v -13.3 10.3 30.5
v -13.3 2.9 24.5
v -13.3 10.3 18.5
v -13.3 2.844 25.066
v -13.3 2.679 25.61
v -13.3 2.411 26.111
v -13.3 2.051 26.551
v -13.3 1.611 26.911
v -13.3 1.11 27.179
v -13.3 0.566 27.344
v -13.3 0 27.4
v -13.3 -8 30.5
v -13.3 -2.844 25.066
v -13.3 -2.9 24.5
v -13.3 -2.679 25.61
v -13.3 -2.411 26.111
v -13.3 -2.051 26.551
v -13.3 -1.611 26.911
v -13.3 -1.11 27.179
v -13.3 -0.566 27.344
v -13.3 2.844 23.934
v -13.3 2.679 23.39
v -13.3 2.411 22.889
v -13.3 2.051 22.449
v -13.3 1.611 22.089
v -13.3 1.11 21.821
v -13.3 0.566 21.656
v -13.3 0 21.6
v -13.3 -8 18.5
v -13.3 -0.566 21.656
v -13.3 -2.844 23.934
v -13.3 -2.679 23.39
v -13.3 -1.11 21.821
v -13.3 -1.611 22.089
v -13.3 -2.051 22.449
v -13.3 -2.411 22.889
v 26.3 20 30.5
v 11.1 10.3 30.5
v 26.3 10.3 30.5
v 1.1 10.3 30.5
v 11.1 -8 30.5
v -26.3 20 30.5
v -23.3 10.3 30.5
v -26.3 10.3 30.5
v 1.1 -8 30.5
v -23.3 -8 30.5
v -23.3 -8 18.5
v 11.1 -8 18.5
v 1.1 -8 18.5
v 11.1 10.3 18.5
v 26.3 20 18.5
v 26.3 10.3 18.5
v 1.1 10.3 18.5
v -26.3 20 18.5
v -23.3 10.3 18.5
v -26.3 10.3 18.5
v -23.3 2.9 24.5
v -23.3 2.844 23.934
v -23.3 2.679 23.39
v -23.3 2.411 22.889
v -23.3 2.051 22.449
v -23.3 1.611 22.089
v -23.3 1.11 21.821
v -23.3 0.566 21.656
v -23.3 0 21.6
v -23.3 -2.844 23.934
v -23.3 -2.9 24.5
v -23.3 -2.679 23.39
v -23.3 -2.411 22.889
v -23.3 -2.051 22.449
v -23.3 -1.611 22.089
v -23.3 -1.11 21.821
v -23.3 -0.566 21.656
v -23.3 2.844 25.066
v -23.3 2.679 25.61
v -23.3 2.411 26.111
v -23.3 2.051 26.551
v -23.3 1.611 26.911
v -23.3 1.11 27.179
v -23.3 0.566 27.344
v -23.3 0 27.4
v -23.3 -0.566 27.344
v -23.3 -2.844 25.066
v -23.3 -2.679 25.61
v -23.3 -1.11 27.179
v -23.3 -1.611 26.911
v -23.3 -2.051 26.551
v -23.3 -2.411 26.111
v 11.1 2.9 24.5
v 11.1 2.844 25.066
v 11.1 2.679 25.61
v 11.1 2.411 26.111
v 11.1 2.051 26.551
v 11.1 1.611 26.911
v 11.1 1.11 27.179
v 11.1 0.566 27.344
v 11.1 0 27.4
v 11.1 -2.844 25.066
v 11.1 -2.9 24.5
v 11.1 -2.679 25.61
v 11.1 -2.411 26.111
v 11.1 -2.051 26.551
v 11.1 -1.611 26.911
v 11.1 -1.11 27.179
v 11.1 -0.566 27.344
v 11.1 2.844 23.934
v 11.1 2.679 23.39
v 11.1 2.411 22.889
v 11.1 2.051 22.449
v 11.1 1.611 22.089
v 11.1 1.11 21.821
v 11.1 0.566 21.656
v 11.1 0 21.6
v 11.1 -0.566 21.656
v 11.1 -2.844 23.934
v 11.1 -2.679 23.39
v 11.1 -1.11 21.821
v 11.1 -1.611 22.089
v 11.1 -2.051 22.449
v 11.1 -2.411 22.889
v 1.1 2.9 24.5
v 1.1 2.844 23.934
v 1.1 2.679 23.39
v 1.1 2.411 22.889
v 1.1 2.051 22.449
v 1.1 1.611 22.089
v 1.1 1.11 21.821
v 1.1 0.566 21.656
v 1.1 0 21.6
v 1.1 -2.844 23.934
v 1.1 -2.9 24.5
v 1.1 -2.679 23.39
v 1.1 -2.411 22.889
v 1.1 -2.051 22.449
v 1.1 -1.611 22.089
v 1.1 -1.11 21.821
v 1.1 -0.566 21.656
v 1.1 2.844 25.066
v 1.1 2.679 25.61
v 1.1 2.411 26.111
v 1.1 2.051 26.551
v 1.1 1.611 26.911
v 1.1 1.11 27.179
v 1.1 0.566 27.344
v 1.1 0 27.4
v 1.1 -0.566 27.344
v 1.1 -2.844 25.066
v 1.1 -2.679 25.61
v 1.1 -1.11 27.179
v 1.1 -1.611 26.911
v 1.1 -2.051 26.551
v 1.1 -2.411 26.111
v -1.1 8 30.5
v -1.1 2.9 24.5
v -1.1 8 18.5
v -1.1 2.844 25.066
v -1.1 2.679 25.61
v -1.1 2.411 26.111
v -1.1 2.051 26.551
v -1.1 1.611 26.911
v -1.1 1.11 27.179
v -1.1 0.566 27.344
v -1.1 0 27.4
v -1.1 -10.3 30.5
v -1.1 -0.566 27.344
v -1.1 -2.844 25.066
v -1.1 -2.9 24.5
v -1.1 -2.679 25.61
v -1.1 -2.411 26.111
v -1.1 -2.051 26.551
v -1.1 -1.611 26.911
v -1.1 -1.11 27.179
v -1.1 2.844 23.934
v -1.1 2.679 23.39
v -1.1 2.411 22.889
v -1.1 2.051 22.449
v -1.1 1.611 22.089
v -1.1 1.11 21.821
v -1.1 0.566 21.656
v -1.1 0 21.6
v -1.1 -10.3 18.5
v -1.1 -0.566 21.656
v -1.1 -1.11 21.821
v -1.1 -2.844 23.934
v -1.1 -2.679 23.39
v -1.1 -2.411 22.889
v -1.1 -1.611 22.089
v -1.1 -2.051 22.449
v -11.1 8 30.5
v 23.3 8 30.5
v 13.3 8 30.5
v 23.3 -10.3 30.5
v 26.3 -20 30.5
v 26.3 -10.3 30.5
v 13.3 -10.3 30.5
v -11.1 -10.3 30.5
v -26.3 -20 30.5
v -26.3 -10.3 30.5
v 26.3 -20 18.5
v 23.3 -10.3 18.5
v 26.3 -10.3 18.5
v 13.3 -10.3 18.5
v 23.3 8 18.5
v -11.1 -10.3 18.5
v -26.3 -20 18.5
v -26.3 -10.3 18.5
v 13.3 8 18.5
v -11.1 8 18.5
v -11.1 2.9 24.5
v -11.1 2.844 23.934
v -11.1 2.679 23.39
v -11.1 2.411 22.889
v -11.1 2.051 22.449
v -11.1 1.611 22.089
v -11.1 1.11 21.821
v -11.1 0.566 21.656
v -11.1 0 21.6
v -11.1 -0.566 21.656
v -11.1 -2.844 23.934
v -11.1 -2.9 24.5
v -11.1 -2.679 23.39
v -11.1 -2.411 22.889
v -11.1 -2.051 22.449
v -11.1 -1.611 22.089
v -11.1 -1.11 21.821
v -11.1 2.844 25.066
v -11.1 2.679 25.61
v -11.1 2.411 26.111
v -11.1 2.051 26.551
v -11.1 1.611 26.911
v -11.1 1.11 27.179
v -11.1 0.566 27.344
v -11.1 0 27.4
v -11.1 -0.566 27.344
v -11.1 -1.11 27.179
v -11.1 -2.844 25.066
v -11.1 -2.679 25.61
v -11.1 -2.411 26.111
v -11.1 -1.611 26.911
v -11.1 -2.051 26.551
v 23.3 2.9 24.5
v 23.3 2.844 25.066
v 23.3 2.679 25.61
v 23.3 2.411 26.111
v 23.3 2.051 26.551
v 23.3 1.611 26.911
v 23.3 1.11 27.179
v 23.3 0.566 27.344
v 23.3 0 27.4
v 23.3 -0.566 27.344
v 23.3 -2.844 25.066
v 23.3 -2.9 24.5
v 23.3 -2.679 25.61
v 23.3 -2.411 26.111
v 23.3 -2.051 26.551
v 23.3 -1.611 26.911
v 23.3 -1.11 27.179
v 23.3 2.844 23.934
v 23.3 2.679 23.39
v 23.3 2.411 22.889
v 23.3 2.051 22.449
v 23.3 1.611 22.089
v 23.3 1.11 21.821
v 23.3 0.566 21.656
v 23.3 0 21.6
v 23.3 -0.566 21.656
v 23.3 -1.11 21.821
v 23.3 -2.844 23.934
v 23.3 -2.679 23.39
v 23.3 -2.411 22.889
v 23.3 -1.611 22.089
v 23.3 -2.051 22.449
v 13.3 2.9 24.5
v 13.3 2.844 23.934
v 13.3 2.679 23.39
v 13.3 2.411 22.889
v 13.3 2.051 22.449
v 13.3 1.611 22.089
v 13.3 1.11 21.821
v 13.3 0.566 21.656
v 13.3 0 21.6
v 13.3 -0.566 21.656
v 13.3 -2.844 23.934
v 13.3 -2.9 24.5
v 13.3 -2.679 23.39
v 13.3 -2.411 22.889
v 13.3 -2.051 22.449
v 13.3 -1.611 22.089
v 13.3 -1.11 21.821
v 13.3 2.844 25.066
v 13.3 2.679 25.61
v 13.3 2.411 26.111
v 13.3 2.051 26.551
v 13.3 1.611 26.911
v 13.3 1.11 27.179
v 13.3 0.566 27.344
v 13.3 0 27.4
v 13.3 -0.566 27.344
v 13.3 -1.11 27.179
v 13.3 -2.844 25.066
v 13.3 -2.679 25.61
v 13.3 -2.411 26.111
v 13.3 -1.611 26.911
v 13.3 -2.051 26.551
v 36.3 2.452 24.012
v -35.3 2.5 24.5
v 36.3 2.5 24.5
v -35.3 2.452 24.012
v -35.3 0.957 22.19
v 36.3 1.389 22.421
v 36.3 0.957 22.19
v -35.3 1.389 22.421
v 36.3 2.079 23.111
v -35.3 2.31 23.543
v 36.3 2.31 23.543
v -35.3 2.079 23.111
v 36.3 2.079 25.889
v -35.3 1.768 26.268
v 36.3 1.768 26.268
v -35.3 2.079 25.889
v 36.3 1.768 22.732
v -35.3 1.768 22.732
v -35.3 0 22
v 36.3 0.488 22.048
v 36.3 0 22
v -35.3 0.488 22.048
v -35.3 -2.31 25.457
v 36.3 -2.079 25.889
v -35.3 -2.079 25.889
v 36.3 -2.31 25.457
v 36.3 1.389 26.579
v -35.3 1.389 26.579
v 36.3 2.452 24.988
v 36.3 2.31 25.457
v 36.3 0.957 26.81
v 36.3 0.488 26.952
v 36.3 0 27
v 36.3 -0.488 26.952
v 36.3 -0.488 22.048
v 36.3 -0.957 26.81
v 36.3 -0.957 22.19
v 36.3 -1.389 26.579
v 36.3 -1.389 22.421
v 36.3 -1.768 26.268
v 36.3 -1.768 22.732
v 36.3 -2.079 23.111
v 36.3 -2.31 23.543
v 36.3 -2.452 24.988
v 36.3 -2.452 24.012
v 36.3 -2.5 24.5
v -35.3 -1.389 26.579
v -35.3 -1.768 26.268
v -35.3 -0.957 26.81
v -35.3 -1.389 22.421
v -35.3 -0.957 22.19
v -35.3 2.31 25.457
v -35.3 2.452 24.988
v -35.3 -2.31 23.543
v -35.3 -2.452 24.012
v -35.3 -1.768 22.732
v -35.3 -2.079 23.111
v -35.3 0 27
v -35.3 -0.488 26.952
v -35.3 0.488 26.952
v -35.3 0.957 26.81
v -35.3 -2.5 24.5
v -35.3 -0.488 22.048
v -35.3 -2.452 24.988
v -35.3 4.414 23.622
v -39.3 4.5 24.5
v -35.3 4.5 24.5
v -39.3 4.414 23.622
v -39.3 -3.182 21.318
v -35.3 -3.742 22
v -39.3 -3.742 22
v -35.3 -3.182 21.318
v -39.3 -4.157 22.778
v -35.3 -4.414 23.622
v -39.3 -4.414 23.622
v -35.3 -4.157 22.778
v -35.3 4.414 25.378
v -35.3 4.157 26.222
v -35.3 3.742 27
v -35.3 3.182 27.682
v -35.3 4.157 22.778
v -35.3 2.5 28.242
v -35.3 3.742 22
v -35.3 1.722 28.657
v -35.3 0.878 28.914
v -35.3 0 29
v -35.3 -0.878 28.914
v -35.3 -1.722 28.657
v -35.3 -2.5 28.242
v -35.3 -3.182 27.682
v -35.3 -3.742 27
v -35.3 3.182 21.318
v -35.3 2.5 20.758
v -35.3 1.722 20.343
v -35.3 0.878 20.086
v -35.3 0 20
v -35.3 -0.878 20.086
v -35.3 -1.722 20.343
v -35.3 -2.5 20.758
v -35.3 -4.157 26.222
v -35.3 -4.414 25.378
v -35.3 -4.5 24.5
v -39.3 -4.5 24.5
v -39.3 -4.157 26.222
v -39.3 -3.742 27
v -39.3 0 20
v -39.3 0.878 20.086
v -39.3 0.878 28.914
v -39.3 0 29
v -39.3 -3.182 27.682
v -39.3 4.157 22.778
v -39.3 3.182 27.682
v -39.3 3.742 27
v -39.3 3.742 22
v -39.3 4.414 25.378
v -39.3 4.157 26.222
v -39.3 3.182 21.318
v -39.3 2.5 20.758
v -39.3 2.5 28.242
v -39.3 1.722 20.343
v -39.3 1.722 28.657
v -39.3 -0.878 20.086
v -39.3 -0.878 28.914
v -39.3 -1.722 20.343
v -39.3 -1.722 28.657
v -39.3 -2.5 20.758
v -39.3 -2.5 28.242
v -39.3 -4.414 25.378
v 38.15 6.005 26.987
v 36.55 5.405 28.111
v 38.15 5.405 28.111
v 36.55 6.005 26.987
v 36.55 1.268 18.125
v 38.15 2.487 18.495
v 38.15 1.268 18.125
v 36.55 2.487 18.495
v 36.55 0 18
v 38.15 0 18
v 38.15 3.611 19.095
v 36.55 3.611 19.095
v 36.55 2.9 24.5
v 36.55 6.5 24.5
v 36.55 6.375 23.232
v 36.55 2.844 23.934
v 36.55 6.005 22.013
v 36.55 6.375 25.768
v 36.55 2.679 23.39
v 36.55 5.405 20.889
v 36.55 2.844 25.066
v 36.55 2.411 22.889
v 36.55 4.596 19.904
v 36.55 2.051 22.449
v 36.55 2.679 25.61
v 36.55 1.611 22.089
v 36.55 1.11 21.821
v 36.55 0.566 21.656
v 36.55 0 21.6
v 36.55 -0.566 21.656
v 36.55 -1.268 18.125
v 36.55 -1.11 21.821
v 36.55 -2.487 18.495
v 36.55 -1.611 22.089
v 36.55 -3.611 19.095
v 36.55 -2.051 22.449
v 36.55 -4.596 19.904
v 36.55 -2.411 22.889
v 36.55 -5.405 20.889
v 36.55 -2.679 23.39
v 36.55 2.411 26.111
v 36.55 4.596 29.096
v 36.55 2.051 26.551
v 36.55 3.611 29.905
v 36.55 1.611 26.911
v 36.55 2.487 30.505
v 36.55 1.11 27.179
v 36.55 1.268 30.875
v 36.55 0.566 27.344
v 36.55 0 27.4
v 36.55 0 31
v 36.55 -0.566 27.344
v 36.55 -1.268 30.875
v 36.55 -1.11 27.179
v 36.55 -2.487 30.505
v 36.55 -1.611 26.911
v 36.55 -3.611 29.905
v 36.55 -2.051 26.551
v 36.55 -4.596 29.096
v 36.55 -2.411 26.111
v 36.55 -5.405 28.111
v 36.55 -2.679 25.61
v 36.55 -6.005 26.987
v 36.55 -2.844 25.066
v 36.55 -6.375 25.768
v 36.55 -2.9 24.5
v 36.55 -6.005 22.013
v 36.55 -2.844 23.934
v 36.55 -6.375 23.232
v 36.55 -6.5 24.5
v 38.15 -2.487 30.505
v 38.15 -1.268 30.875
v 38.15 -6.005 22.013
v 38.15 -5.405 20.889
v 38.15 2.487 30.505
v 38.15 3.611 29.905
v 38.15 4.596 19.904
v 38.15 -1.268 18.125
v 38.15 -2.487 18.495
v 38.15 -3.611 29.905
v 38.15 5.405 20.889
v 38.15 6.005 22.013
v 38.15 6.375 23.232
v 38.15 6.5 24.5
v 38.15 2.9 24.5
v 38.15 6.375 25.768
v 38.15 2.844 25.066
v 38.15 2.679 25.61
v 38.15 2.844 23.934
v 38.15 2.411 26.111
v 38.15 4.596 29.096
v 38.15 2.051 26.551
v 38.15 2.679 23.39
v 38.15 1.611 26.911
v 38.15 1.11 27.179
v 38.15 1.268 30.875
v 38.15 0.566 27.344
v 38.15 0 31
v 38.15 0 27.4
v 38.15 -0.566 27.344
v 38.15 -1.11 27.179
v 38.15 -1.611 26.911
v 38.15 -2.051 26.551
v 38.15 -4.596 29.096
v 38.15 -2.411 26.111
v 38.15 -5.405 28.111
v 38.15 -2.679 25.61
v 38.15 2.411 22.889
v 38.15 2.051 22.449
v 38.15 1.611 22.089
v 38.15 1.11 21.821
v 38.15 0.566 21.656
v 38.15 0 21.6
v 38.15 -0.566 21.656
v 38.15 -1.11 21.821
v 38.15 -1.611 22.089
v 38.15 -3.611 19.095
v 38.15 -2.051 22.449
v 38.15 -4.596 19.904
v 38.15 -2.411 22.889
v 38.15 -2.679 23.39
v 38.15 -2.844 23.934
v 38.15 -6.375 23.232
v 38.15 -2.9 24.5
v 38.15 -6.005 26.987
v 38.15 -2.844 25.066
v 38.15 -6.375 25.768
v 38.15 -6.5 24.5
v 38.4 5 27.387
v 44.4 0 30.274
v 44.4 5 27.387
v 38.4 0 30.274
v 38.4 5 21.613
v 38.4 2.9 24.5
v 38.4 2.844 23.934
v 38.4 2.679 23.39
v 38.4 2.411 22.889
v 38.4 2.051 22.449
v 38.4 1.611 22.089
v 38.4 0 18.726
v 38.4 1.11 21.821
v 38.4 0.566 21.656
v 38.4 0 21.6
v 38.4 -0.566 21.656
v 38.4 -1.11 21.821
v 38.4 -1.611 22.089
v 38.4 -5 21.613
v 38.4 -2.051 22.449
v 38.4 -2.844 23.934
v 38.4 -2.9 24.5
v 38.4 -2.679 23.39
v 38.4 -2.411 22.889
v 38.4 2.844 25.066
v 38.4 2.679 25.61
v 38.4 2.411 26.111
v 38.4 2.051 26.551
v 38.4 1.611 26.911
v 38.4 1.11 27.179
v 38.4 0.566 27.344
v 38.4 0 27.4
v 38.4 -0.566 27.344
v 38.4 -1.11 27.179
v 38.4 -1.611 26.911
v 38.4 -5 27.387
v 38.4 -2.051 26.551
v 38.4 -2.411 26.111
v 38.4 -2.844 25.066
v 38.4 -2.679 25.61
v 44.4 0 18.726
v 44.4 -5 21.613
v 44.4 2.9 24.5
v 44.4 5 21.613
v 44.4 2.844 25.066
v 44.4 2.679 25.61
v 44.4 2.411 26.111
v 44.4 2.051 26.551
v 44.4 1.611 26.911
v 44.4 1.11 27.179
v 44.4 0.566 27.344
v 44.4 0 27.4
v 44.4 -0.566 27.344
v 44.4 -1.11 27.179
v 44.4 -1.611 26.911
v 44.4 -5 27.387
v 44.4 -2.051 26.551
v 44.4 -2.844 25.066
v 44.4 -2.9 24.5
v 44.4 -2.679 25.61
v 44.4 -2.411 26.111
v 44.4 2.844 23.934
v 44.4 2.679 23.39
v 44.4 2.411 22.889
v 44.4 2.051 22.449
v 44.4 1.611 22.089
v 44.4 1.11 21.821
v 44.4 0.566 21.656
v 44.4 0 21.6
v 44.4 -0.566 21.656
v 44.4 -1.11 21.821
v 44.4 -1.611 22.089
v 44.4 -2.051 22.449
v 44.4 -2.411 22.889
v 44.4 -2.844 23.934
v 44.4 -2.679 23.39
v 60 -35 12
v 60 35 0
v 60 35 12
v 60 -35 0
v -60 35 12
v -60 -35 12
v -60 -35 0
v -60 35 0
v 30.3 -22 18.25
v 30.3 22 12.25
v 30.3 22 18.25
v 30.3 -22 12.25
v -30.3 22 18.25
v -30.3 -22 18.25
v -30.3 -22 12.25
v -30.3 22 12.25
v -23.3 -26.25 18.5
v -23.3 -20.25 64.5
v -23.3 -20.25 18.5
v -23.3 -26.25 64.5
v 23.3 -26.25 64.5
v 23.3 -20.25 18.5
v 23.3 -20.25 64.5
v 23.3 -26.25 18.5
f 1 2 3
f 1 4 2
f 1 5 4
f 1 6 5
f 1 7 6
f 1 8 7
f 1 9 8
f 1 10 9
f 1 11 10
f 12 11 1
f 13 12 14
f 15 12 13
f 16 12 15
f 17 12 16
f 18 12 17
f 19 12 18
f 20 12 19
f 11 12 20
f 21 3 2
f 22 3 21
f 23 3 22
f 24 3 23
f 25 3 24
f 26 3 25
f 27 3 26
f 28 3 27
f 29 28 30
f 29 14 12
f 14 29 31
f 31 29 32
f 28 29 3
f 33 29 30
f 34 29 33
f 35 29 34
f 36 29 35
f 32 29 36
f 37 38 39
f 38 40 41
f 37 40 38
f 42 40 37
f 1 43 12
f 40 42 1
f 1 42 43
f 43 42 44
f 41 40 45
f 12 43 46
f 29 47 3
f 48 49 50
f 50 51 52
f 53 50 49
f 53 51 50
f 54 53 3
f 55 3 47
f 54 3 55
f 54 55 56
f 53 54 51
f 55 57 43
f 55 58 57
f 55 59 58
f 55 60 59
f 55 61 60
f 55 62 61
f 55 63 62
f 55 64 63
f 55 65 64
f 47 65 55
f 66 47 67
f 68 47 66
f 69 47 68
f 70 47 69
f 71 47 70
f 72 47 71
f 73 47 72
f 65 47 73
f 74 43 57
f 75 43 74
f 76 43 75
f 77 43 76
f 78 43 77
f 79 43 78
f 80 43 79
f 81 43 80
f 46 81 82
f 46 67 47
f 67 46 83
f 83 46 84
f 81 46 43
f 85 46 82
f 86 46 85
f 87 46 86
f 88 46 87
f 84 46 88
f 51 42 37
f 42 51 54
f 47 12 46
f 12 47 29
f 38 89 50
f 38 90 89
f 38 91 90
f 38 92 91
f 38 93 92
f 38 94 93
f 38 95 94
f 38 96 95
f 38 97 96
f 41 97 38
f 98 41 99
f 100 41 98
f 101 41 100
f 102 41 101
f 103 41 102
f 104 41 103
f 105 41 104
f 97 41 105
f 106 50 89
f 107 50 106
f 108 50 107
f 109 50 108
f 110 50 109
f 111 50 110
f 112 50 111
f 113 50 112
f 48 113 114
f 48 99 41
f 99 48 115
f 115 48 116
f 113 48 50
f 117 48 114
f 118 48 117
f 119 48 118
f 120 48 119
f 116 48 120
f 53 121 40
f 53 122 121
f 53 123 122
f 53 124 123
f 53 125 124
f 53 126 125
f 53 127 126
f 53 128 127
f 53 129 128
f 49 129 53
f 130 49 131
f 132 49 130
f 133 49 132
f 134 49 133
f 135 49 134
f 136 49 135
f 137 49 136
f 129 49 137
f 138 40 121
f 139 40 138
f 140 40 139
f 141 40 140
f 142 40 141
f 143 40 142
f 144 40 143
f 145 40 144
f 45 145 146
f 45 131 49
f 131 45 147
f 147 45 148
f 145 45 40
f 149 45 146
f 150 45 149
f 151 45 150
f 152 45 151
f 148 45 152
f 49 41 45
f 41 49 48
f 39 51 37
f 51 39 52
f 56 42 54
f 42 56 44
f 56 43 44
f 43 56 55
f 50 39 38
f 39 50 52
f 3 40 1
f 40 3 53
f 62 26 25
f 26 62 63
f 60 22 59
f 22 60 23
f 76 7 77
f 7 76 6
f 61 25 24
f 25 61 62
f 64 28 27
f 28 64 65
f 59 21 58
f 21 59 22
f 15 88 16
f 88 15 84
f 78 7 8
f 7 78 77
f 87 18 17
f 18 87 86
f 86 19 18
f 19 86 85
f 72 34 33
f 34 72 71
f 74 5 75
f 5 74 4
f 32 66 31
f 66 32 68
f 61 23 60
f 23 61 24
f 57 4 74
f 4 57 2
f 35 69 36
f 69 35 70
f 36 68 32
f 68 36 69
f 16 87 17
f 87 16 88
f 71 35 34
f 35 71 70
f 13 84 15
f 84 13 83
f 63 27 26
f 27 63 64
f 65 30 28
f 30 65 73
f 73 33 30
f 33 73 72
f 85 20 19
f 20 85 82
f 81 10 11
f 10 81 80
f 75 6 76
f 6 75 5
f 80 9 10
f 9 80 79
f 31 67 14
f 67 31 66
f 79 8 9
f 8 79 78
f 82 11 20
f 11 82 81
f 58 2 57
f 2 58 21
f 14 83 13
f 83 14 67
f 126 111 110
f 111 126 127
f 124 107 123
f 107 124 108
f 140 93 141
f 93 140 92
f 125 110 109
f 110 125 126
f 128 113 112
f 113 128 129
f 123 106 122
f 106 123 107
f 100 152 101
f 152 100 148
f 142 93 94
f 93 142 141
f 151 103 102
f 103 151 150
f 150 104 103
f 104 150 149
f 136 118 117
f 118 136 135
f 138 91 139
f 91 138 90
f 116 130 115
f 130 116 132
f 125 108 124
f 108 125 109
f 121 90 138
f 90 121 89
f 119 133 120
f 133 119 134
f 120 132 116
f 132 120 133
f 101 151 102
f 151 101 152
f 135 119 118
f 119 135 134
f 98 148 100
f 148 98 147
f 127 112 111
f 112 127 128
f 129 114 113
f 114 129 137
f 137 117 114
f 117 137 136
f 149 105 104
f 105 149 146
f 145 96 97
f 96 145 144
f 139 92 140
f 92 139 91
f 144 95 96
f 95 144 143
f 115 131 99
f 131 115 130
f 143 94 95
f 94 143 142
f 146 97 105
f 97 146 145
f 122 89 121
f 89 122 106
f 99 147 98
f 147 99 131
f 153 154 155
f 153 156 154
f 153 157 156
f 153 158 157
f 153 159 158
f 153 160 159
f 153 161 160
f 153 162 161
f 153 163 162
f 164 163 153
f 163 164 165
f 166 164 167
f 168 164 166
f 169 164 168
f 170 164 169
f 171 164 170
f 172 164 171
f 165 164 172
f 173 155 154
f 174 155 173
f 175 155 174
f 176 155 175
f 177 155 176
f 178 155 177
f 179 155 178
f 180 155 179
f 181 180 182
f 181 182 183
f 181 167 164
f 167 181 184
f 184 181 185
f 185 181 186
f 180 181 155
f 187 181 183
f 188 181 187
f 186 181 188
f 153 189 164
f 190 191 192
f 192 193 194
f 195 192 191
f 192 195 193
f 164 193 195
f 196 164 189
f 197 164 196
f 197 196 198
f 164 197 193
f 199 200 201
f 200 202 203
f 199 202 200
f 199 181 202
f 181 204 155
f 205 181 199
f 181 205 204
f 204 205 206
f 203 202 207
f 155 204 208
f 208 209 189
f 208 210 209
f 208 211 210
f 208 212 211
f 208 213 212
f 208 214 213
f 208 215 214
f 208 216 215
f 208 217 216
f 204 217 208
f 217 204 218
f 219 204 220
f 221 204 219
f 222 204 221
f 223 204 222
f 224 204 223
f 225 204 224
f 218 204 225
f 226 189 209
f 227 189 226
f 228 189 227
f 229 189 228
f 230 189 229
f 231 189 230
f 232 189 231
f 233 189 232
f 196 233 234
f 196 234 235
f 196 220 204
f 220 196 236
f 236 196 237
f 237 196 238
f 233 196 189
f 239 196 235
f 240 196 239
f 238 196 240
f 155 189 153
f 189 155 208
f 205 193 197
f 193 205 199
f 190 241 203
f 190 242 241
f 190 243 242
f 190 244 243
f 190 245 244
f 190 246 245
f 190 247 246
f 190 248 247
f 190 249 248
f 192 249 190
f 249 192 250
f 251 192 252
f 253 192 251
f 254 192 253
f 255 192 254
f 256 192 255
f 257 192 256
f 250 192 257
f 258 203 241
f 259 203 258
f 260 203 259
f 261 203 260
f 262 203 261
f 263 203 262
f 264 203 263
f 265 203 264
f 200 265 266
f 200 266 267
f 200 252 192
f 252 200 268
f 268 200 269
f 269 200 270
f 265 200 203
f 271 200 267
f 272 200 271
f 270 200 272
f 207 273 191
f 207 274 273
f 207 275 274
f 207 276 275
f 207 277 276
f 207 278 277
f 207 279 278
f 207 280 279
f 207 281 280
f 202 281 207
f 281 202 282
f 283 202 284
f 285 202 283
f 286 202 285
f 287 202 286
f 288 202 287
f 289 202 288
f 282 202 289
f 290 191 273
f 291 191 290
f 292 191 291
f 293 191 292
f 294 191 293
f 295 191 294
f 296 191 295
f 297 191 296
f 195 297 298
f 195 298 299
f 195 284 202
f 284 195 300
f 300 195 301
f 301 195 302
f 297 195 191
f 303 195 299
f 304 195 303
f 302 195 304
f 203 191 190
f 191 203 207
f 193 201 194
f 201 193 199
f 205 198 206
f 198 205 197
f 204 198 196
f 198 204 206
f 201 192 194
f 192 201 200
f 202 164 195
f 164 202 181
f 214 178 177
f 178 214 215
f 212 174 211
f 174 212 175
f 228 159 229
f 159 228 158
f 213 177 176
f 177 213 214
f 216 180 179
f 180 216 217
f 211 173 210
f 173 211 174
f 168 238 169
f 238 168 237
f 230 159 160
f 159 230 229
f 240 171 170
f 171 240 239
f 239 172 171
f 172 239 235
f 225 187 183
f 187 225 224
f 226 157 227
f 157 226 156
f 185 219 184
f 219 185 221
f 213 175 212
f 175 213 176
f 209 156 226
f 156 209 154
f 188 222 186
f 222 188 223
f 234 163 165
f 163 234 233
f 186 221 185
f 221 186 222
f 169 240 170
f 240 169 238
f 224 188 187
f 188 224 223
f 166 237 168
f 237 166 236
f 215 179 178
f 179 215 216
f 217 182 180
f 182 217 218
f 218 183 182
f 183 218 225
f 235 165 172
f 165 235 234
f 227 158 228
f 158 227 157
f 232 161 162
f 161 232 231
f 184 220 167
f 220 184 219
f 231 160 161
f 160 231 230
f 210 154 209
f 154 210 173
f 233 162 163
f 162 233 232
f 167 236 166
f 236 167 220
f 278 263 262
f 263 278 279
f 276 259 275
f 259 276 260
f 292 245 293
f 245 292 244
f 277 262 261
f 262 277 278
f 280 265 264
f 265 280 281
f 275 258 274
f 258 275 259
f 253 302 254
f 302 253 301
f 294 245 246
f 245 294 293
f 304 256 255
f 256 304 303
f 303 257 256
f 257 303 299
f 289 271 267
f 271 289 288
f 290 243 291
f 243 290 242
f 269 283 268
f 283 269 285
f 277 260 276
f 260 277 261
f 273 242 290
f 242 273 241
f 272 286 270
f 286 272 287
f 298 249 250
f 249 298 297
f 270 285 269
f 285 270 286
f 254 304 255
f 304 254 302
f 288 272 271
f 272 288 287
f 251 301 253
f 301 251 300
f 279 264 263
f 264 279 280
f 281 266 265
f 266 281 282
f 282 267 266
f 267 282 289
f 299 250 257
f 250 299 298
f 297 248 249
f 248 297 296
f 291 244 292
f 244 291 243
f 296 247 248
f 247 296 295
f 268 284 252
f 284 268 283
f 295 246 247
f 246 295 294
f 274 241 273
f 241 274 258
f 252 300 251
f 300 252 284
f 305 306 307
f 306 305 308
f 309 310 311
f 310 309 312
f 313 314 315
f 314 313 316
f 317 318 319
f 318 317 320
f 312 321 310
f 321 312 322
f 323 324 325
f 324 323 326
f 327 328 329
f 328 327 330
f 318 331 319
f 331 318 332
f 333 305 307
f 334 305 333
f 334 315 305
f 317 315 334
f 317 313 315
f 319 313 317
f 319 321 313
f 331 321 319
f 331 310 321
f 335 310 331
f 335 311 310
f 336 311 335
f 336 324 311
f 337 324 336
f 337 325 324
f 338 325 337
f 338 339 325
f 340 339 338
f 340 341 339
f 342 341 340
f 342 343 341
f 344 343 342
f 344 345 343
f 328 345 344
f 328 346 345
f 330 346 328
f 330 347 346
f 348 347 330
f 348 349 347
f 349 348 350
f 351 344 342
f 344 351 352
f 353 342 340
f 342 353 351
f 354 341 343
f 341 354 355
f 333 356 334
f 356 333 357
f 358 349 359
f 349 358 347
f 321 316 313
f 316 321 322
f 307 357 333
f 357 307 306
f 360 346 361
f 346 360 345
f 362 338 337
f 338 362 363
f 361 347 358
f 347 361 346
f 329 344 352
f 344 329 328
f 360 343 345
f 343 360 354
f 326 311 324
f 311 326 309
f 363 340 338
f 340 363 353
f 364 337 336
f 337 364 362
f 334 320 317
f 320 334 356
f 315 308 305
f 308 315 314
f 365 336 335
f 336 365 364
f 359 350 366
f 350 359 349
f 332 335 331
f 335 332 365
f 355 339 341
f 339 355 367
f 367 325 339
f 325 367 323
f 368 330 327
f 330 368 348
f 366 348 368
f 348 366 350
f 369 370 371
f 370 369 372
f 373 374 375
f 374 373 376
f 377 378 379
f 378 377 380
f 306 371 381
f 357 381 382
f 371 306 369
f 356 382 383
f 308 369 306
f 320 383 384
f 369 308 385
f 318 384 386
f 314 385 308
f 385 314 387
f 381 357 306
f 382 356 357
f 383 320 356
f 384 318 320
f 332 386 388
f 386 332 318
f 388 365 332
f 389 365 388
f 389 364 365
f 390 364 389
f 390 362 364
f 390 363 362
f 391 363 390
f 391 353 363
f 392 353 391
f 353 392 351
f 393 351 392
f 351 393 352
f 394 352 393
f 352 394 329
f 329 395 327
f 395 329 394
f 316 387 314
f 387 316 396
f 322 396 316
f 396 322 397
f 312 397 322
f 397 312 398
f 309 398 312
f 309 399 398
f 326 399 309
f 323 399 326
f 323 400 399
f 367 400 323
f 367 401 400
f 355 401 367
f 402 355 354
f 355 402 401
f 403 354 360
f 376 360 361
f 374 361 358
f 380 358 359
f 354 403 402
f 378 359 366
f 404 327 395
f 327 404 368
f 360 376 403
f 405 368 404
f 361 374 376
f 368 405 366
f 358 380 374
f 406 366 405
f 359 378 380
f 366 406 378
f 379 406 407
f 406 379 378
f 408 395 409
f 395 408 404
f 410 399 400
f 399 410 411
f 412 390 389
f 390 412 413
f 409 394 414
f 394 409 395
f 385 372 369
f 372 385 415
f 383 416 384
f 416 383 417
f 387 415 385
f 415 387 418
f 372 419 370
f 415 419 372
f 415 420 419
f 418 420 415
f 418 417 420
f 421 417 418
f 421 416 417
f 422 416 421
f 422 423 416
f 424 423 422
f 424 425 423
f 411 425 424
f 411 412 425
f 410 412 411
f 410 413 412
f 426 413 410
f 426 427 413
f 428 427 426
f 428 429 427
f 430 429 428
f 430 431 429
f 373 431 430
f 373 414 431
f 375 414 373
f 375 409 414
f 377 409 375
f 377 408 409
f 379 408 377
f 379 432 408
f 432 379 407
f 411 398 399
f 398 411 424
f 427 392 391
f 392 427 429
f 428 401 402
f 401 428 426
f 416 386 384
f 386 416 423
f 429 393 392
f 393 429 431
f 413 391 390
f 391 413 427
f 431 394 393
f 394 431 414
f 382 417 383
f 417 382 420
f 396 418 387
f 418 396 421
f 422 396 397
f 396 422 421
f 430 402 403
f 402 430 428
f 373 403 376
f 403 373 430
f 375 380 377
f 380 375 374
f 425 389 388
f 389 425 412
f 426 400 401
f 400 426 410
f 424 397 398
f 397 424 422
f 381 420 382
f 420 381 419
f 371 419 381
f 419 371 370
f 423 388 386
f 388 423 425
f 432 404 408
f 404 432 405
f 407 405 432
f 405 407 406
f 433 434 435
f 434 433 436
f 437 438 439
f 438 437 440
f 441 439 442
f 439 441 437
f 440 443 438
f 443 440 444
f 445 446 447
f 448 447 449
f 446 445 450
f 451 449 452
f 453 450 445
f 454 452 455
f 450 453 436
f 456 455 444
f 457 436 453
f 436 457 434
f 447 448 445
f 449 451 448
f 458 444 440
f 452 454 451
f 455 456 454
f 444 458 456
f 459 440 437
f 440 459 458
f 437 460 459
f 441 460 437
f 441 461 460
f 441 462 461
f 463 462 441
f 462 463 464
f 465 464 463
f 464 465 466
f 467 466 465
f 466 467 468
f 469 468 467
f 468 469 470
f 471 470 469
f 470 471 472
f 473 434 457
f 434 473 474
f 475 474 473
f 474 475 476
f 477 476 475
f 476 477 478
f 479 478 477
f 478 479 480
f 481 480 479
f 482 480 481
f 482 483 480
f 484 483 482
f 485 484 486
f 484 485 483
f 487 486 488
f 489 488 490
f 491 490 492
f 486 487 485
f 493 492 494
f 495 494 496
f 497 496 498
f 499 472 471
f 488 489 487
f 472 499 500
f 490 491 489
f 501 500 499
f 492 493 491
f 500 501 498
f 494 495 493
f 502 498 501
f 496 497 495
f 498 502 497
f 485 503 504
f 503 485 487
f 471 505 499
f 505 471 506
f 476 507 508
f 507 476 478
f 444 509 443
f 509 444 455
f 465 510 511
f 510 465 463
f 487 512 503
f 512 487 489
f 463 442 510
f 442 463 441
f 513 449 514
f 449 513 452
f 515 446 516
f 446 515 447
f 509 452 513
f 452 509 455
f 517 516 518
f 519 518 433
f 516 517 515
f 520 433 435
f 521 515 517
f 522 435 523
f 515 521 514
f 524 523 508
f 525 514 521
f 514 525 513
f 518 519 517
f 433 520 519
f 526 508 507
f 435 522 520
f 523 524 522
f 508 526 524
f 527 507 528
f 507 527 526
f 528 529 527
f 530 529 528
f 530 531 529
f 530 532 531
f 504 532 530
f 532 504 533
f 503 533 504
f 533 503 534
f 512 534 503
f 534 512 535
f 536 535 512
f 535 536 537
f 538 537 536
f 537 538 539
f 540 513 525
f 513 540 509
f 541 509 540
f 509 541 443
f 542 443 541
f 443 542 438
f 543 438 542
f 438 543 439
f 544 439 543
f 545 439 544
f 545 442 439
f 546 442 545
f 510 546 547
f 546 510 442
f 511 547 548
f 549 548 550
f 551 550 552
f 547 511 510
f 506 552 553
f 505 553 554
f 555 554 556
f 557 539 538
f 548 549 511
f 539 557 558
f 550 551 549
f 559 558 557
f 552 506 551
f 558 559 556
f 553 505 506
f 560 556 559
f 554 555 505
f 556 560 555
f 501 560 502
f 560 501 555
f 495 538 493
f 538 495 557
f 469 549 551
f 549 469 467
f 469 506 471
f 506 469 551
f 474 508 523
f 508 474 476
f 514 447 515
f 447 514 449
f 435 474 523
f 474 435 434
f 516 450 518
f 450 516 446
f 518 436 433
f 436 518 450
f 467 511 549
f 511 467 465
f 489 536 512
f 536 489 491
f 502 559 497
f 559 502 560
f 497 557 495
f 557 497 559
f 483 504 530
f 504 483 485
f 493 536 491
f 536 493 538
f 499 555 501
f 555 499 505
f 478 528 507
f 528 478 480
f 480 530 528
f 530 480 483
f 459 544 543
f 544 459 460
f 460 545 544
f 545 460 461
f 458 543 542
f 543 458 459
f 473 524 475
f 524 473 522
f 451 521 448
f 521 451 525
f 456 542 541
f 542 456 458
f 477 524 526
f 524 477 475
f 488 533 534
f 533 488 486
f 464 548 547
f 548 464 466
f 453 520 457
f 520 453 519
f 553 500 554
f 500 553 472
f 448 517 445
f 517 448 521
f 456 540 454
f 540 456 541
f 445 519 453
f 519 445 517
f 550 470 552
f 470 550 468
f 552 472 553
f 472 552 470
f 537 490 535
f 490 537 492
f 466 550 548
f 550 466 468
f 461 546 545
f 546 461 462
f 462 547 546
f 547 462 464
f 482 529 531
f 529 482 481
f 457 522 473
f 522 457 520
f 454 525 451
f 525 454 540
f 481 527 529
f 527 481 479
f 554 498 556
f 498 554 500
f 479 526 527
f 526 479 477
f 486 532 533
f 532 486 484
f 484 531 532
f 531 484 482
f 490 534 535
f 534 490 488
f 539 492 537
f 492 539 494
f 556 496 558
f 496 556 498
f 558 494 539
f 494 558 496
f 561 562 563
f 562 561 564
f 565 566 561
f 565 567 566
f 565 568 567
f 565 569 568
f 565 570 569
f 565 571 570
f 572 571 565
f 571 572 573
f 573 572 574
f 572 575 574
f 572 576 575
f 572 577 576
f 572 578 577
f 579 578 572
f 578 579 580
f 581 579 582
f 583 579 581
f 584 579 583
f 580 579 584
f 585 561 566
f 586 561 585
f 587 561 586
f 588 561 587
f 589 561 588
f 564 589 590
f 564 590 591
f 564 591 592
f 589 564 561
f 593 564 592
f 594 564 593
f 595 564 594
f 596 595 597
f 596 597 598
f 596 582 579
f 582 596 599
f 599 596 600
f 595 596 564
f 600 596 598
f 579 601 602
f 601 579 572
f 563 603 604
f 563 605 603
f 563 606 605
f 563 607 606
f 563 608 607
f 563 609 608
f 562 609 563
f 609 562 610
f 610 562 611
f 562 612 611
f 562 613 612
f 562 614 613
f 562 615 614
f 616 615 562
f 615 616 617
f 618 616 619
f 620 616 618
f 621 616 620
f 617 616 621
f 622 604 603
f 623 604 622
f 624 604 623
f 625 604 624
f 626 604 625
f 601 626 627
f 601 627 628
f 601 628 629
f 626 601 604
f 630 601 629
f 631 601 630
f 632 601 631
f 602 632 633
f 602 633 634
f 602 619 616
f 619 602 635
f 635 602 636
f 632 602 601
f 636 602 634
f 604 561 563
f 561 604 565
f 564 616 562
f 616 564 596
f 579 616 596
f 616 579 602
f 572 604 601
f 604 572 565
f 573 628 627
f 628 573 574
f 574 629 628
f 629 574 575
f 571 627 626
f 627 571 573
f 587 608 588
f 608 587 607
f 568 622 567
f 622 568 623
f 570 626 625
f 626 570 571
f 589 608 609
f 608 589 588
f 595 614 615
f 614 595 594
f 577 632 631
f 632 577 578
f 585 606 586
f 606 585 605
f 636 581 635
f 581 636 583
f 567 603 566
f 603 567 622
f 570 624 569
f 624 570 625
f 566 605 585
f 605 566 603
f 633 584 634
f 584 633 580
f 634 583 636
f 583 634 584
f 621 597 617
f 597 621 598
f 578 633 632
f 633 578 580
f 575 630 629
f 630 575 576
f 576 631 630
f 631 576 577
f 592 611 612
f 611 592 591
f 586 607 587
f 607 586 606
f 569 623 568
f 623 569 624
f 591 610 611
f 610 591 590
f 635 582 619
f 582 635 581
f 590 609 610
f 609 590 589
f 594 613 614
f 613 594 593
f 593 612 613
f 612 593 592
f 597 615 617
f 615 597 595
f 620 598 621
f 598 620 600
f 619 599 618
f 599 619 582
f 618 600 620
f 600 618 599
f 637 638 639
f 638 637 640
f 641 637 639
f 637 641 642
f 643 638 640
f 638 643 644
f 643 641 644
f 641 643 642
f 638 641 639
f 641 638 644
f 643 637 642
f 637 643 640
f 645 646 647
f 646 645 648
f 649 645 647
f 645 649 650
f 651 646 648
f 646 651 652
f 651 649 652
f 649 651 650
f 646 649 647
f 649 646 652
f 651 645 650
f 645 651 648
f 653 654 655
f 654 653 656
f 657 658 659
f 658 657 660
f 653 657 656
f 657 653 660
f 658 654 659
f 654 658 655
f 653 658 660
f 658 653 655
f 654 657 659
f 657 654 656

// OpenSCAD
$fn = 32;

// ------------------------------------------------------------------------
// Comb hinge with flap: leaf 52.6 x 20 mm, pin d5, flap 46 mm
// Every part is its own module, assembly() places every instance.
// ------------------------------------------------------------------------

// --- part 1 ---
module hinge_bed() {
  difference() {
    translate([-60, -35, 0]) cube([120, 70, 12]);
  }
}

// --- part 2 ---
module hinge_riser() {
  difference() {
    translate([-30.3, -22, 0]) cube([60.6, 44, 6]);
  }
}

// --- part 3 ---
module hinge_leaf_a() {
  difference() {
    union() {
      translate([-23.3, -8, -6]) cube([10, 28, 12]);
      translate([1.1, -8, -6]) cube([10, 28, 12]);
      translate([-26.3, 10.3, -6]) cube([52.6, 9.7, 12]);
    }
    translate([-18.3, 0, 0]) rotate([0, 90, 0]) cylinder(h = 12, d = 5.8, center = true);
    translate([6.1, 0, 0]) rotate([0, 90, 0]) cylinder(h = 12, d = 5.8, center = true);
  }
}

// --- part 4 ---
module hinge_leaf_b() {
  difference() {
    union() {
      translate([-11.1, -20, -6]) cube([10, 28, 12]);
      translate([13.3, -20, -6]) cube([10, 28, 12]);
      translate([-26.3, -20, -6]) cube([52.6, 9.7, 12]);
    }
    translate([-6.1, 0, 0]) rotate([0, 90, 0]) cylinder(h = 12, d = 5.8, center = true);
    translate([18.3, 0, 0]) rotate([0, 90, 0]) cylinder(h = 12, d = 5.8, center = true);
  }
}

// --- part 5 ---
module hinge_flap() {
  difference() {
    translate([-23.3, -23, 0]) cube([46.6, 46, 6]);
  }
}

// --- part 6 ---
module hinge_pin() {
  rotate([0, 90, 0]) cylinder(h = 72.6, d = 5, center = true);
  translate([-39.3, 0, 0]) rotate([0, 90, 0]) cylinder(h = 4, d = 9);
}

// --- part 7 ---
module pin_washer() {
  difference() {
      translate([0, 0, 0]) cylinder(h = 1.6, d = 13);
      translate([0, 0, -1]) cylinder(h = 3.6, d = 5.8);
    }
}

// --- part 8 ---
module pin_nut() {
  difference() {
    linear_extrude(height = 6) polygon(points = [[5.774, 0], [2.887, 5], [-2.887, 5], [-5.774, 0], [-2.887, -5], [2.887, -5]]);
    translate([0, 0, -1]) cylinder(h = 8, d = 5.8);
  }
}

// --- assembly ---
module assembly() {
  color([0.80, 0.24, 0.20]) translate([0, 0, 0]) rotate([0, 0, 0]) hinge_bed();
  color([0.20, 0.45, 0.75]) translate([0, 0, 12.25]) rotate([0, 0, 0]) hinge_riser();
  color([0.25, 0.62, 0.32]) translate([0, 0, 24.5]) rotate([0, 0, 0]) hinge_leaf_a();
  color([0.92, 0.70, 0.18]) translate([0, 0, 24.5]) rotate([0, 0, 0]) hinge_leaf_b();
  color([0.58, 0.35, 0.70]) translate([0, -20.25, 41.5]) rotate([90, 0, 0]) hinge_flap();
  color([0.16, 0.66, 0.66]) translate([0, 0, 24.5]) rotate([0, 0, 0]) hinge_pin();
  color([0.85, 0.48, 0.18]) translate([36.55, 0, 24.5]) rotate([0, 90, 0]) pin_washer();
  color([0.55, 0.60, 0.65]) translate([38.4, 0, 24.5]) rotate([0, 90, 0]) pin_nut();
}

assembly();
